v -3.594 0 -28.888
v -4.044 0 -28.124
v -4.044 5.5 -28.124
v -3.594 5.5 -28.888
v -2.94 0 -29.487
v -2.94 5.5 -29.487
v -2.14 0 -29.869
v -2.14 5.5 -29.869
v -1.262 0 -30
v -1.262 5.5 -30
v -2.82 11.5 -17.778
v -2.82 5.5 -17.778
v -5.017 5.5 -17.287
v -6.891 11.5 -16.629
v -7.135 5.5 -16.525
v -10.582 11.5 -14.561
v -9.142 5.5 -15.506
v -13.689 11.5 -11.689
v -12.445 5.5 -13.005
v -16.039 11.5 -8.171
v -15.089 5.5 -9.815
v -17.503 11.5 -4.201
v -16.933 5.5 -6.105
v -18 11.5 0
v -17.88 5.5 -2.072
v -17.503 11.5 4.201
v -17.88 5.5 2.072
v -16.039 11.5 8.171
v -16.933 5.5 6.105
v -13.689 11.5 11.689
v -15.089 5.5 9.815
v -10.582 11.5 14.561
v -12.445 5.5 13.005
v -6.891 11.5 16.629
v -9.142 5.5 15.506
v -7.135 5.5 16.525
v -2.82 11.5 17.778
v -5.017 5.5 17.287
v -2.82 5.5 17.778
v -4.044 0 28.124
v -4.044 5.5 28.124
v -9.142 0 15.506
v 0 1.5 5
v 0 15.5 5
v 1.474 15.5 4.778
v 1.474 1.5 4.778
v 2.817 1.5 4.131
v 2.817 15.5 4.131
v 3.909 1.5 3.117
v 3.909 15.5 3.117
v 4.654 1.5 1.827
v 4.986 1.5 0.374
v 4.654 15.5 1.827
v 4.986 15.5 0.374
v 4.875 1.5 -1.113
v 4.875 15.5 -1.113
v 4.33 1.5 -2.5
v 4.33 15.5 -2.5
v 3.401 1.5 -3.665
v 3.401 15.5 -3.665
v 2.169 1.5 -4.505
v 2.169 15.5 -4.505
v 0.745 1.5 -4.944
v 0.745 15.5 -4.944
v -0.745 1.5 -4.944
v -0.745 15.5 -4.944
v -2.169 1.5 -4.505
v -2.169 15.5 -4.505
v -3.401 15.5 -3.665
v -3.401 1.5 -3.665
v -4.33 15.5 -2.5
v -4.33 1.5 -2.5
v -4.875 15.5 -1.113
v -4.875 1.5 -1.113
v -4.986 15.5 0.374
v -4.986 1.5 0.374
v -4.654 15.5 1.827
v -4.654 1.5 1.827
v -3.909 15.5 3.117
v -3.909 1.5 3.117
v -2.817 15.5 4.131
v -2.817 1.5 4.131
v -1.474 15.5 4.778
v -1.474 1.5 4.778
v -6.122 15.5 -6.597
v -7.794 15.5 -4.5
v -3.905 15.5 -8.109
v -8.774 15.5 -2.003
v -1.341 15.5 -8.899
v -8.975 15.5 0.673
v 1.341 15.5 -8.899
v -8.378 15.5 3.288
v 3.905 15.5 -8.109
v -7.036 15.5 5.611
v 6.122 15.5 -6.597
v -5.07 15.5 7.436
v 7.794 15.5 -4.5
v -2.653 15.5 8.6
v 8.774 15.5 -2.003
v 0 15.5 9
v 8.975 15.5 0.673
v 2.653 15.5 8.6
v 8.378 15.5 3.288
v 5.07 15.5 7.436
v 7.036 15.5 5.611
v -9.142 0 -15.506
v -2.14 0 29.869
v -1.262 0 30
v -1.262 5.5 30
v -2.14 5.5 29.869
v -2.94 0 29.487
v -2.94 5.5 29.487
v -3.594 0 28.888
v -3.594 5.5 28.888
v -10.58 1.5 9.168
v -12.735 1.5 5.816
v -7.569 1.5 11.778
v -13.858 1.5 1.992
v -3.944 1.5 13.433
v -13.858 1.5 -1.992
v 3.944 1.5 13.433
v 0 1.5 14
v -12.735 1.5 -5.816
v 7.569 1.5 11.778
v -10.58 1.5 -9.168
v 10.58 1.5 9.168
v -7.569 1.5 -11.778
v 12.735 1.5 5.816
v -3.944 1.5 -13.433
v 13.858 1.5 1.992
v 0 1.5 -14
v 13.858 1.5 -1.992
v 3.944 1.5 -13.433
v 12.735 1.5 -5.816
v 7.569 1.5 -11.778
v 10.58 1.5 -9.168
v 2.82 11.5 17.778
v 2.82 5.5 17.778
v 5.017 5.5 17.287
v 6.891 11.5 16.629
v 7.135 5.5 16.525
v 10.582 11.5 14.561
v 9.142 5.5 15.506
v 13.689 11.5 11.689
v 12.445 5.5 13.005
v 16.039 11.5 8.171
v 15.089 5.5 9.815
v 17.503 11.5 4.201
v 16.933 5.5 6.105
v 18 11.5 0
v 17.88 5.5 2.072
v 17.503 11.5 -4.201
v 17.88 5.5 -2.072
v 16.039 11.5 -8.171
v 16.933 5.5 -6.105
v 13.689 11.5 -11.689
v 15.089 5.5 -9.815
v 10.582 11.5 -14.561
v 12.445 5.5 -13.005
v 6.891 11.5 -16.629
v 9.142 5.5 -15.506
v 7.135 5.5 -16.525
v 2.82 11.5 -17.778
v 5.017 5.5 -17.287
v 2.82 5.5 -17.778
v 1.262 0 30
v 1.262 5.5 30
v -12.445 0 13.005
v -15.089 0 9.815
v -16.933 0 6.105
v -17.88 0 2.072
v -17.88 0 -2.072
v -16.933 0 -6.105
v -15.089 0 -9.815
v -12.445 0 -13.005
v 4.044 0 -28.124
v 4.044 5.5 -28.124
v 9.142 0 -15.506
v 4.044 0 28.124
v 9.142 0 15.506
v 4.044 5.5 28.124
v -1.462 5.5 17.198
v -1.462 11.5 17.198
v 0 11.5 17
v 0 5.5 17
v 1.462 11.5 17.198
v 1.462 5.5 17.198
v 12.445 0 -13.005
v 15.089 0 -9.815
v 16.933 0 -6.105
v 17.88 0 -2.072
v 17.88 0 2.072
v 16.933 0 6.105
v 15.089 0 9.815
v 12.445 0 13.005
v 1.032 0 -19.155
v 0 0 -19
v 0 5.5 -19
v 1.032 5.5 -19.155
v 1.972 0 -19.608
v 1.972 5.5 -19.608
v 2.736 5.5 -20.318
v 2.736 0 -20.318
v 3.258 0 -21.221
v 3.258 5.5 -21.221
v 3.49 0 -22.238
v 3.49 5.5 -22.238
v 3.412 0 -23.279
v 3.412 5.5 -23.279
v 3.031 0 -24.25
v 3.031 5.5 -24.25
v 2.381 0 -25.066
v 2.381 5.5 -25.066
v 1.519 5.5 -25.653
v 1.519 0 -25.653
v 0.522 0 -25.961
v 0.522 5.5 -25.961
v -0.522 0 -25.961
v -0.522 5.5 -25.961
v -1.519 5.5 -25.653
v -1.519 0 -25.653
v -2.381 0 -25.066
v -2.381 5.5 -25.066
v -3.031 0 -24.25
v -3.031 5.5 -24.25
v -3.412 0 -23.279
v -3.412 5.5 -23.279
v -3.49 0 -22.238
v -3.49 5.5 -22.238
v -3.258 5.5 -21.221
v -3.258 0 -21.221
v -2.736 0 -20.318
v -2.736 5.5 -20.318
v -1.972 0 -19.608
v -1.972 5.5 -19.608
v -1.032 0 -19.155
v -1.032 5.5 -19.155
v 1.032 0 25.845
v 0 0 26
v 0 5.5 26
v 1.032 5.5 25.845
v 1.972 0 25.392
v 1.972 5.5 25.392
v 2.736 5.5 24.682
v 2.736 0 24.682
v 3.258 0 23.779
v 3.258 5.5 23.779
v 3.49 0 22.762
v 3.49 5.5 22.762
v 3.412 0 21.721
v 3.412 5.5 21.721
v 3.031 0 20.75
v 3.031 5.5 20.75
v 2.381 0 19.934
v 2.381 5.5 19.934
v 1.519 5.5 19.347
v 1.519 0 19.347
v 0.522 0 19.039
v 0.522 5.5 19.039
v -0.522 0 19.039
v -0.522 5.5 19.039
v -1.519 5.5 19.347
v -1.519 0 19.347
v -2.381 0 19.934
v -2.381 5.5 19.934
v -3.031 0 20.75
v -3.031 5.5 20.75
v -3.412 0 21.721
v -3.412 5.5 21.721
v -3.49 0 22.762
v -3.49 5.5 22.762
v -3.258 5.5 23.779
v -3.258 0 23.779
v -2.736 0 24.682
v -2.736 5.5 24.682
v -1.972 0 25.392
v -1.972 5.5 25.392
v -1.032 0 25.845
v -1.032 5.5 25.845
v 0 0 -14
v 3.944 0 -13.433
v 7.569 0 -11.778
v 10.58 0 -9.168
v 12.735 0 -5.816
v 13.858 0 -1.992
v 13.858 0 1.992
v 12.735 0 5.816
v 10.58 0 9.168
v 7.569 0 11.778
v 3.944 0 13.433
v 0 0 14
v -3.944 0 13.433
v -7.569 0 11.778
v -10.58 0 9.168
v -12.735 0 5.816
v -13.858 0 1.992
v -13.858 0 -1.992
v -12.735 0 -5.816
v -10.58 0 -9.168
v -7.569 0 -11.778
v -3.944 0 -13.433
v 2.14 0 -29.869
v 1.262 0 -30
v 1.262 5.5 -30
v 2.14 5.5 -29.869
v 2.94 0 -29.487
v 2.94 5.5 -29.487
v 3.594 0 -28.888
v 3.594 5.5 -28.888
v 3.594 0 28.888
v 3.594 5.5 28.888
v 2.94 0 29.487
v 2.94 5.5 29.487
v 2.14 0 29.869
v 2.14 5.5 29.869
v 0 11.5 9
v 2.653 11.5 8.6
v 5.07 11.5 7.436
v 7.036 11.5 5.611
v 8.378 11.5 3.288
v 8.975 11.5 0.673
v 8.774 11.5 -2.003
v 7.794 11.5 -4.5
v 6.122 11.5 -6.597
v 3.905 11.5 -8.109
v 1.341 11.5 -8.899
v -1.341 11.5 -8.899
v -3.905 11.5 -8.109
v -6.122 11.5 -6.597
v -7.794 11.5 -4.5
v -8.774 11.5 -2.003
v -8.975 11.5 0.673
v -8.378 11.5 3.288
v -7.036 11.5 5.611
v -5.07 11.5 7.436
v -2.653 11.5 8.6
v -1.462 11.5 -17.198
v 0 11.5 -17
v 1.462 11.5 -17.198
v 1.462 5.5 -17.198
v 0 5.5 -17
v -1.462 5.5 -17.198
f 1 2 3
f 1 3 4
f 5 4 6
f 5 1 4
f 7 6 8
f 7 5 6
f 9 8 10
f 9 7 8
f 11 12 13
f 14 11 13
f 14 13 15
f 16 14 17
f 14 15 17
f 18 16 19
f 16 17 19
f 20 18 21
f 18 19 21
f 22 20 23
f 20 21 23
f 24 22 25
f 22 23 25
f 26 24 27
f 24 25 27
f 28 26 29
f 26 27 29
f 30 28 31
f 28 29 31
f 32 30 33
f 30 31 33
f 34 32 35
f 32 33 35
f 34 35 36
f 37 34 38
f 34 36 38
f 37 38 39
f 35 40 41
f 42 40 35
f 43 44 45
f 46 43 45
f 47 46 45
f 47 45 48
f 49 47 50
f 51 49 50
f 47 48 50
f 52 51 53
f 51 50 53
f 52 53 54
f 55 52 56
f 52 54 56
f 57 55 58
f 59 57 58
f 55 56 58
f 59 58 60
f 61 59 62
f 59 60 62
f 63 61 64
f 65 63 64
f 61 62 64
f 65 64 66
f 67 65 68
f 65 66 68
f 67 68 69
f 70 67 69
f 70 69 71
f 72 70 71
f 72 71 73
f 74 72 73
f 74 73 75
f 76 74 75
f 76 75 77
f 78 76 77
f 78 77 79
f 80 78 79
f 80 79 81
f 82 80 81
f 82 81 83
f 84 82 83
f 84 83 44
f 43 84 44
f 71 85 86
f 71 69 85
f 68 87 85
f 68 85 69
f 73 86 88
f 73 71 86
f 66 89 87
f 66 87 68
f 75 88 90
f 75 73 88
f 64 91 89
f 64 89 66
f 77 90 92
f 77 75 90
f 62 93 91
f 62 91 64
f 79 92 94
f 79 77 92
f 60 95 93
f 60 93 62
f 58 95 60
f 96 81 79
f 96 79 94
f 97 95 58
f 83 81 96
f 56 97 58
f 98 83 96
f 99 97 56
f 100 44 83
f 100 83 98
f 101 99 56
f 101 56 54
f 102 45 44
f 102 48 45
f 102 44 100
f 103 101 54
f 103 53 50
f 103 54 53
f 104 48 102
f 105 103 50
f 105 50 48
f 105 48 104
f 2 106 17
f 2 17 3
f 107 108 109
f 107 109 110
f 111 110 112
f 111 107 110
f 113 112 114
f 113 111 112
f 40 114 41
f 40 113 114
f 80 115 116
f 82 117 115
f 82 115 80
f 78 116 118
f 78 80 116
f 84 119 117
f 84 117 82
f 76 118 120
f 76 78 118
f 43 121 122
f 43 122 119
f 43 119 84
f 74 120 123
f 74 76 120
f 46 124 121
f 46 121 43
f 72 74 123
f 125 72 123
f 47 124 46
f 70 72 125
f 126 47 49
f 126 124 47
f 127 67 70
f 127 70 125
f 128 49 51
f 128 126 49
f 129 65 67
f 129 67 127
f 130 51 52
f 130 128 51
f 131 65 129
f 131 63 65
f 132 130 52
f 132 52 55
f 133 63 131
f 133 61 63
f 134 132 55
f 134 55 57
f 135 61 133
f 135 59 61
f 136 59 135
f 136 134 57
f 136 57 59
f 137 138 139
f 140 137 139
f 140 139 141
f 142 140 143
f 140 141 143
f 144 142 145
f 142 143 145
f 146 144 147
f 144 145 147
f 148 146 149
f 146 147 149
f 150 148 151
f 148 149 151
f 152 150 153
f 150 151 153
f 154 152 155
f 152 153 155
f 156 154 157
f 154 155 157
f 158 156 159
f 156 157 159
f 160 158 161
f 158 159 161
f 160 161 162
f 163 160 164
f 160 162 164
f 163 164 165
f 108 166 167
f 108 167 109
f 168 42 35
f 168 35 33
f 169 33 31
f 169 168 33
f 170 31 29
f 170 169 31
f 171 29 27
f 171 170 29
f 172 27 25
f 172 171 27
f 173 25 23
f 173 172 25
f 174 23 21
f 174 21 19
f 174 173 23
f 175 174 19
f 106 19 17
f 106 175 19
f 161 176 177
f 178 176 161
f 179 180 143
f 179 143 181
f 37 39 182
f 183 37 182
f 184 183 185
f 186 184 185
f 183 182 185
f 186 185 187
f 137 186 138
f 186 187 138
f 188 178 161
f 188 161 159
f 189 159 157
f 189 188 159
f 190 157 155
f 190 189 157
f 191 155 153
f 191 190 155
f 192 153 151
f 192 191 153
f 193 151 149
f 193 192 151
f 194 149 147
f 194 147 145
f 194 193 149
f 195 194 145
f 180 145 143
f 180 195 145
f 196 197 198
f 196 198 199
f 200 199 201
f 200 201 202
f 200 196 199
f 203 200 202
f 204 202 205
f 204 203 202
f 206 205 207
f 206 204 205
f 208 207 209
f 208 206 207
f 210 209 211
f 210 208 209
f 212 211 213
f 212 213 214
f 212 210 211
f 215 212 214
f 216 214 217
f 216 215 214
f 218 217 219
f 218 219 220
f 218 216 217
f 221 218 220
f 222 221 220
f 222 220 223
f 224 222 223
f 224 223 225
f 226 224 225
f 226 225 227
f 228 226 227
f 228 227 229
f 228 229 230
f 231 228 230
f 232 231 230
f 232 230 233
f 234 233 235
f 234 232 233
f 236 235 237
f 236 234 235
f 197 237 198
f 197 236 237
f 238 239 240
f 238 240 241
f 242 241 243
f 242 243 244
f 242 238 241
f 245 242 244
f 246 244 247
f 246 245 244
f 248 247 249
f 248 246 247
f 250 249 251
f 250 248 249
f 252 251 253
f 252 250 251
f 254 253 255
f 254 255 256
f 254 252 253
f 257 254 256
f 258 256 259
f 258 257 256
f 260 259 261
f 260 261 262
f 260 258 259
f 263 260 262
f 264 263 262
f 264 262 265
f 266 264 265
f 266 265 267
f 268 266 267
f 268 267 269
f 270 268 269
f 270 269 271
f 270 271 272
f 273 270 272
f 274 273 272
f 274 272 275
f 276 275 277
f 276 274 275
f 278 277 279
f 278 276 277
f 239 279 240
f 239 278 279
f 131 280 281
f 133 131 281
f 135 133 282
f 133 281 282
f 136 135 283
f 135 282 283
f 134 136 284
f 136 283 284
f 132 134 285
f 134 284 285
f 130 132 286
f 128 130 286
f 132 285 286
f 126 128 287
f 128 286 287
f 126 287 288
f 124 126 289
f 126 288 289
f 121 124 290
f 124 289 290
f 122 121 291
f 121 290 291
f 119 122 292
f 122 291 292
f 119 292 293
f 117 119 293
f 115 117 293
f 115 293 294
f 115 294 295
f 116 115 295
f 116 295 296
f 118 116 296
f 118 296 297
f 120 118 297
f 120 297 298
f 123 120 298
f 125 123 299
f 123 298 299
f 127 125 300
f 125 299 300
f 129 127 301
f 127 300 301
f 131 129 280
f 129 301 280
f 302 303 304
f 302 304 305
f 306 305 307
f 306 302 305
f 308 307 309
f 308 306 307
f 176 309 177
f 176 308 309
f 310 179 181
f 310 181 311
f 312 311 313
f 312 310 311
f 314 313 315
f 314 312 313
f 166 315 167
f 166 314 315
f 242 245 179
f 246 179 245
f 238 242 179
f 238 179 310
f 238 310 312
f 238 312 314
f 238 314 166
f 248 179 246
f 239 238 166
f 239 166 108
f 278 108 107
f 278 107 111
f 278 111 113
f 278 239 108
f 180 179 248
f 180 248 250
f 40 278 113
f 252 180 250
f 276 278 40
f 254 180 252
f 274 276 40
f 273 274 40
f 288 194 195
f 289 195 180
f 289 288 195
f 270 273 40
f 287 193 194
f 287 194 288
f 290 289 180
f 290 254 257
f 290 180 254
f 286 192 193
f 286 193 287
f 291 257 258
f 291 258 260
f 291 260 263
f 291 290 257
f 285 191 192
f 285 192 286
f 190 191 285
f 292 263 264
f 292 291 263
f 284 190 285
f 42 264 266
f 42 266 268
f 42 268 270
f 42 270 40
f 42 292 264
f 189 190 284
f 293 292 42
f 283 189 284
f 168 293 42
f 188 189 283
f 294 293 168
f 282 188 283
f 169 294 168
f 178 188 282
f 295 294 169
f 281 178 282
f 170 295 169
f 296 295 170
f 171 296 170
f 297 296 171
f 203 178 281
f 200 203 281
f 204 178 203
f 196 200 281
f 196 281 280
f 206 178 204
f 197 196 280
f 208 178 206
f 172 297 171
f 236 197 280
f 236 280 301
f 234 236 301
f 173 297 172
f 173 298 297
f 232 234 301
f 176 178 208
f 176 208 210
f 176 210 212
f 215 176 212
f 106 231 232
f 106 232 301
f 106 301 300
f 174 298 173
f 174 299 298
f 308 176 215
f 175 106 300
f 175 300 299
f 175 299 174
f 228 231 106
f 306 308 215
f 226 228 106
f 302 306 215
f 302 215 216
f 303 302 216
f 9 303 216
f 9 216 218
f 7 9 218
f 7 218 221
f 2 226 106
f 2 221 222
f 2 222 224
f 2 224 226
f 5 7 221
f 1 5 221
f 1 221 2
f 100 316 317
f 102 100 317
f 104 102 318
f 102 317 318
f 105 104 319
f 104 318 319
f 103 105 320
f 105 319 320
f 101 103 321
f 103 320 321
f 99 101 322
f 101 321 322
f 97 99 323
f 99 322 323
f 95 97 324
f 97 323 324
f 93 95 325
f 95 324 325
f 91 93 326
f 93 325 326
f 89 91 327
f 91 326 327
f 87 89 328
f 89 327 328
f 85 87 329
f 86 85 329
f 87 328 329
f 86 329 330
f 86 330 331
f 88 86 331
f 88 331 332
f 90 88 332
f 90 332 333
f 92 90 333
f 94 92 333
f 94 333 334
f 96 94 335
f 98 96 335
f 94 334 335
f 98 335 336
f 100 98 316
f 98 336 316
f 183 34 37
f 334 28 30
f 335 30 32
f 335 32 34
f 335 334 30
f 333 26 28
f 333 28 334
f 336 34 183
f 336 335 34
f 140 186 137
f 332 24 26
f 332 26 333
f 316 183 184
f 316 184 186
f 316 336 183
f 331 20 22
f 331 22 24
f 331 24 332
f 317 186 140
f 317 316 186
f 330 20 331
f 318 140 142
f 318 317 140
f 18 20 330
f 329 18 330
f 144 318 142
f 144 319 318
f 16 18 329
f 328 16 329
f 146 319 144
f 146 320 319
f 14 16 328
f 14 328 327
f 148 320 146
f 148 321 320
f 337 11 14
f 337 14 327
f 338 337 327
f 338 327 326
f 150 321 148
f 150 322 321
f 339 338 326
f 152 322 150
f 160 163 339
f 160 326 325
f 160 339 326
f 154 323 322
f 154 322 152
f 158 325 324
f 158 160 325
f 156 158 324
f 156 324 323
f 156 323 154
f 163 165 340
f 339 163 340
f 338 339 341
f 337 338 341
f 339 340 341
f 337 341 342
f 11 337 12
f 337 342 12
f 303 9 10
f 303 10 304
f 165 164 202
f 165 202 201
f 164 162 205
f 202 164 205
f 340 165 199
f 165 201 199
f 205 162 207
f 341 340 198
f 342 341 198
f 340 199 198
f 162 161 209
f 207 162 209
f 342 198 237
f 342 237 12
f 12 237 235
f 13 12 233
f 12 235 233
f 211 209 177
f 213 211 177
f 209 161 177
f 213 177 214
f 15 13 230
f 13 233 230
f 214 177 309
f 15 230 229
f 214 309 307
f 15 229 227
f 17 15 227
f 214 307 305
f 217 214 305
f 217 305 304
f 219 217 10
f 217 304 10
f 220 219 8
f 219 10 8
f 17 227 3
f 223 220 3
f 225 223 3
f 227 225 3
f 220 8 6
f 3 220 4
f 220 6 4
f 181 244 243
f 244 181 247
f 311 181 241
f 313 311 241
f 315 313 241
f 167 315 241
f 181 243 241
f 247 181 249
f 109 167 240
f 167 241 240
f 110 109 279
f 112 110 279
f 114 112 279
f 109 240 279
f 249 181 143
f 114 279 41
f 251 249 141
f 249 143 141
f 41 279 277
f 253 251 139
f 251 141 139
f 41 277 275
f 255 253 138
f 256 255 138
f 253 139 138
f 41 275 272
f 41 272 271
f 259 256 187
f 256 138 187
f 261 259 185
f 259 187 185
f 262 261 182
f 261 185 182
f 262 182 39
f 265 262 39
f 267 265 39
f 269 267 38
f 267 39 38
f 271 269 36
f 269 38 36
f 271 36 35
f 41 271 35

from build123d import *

# Parameters (mm, degrees)
SKETCH1_R      = 3.5
EXTRUDE1_DEPTH = 5.5
EXTRUDE2_DEPTH = 6
SKETCH3_R      = 9
EXTRUDE3_DEPTH = 4
SKETCH4_R      = 5
EXTRUDE4_DEPTH = 20
SKETCH5_R      = 14
EXTRUDE5_DEPTH = 1.5


with BuildPart() as part:
    # Sketch1 → Extrude1 (new body)
    with BuildSketch(Plane(origin=(0, 0, 0), x_dir=(1, 0, 0), z_dir=(0, 1, 0))):
        with BuildLine():
            Line((-9.142025191, 15.505591746), (-4.043990115, 28.123809223))
            ThreePointArc((-4.043990115, 28.123809223), (-2.940017716, 29.487109534), (-1.262434286, 30))
            Line((-1.262434286, 30), (1.262434286, 30))
            ThreePointArc((1.262434286, 30), (2.940017716, 29.487109534), (4.043990115, 28.123809223))
            Line((4.043990115, 28.123809223), (9.142025191, 15.505591746))
            ThreePointArc((9.142025191, 15.505591746), (18, 0), (9.142025191, -15.505591746))
            Line((9.142025191, -15.505591746), (4.043990115, -28.123809223))
            ThreePointArc((4.043990115, -28.123809223), (2.940017716, -29.487109534), (1.262434286, -30))
            Line((1.262434286, -30), (-1.262434286, -30))
            ThreePointArc((-1.262434286, -30), (-2.940017716, -29.487109534), (-4.043990115, -28.123809223))
            Line((-4.043990115, -28.123809223), (-9.142025191, -15.505591746))
            ThreePointArc((-9.142025191, -15.505591746), (-18, 0), (-9.142025191, 15.505591746))
        make_face()
        with Locations(Location((0, 22.5, 0), (0, 0, 270))):
            Circle(SKETCH1_R, mode=Mode.SUBTRACT)
        with Locations(Location((0, -22.5, 0), (0, 0, 270))):
            Circle(SKETCH1_R, mode=Mode.SUBTRACT)
    extrude(amount=EXTRUDE1_DEPTH)

    # Sketch2 → Extrude2 (add)
    with BuildSketch(Plane(origin=(0, 5.5, 0), x_dir=(1, 0, 0), z_dir=(0, 1, 0))):
        with BuildLine():
            ThreePointArc((2.819683898, -17.777777778), (18, 0), (2.819683898, 17.777777778))
            ThreePointArc((2.819683898, 17.777777778), (0, 17), (-2.819683898, 17.777777778))
            ThreePointArc((-2.819683898, 17.777777778), (-18, 0), (-2.819683898, -17.777777778))
            ThreePointArc((-2.819683898, -17.777777778), (0, -17), (2.819683898, -17.777777778))
        make_face()
    extrude(amount=EXTRUDE2_DEPTH)

    # Sketch3 → Extrude3 (add)
    with BuildSketch(Plane(origin=(0, 11.5, 0), x_dir=(1, 0, 0), z_dir=(0, 1, 0))):
        with Locations(Location((0, 0, 0), (0, 0, 270))):
            Circle(SKETCH3_R)
    extrude(amount=EXTRUDE3_DEPTH)

    # Sketch4 → Extrude4 (cut)
    with BuildSketch(Plane(origin=(0, 15.5, 0), x_dir=(1, 0, 0), z_dir=(0, 1, 0))):
        with Locations(Location((0, 0, 0), (0, 0, 270))):
            Circle(SKETCH4_R)
    extrude(amount=-EXTRUDE4_DEPTH, mode=Mode.SUBTRACT)

    # Sketch5 → Extrude5 (cut)
    with BuildSketch(Plane.XZ):
        with Locations(Location((0, 0, 0), (0, 0, 270))):
            Circle(SKETCH5_R)
    extrude(amount=-EXTRUDE5_DEPTH, mode=Mode.SUBTRACT)


solid = part.part
